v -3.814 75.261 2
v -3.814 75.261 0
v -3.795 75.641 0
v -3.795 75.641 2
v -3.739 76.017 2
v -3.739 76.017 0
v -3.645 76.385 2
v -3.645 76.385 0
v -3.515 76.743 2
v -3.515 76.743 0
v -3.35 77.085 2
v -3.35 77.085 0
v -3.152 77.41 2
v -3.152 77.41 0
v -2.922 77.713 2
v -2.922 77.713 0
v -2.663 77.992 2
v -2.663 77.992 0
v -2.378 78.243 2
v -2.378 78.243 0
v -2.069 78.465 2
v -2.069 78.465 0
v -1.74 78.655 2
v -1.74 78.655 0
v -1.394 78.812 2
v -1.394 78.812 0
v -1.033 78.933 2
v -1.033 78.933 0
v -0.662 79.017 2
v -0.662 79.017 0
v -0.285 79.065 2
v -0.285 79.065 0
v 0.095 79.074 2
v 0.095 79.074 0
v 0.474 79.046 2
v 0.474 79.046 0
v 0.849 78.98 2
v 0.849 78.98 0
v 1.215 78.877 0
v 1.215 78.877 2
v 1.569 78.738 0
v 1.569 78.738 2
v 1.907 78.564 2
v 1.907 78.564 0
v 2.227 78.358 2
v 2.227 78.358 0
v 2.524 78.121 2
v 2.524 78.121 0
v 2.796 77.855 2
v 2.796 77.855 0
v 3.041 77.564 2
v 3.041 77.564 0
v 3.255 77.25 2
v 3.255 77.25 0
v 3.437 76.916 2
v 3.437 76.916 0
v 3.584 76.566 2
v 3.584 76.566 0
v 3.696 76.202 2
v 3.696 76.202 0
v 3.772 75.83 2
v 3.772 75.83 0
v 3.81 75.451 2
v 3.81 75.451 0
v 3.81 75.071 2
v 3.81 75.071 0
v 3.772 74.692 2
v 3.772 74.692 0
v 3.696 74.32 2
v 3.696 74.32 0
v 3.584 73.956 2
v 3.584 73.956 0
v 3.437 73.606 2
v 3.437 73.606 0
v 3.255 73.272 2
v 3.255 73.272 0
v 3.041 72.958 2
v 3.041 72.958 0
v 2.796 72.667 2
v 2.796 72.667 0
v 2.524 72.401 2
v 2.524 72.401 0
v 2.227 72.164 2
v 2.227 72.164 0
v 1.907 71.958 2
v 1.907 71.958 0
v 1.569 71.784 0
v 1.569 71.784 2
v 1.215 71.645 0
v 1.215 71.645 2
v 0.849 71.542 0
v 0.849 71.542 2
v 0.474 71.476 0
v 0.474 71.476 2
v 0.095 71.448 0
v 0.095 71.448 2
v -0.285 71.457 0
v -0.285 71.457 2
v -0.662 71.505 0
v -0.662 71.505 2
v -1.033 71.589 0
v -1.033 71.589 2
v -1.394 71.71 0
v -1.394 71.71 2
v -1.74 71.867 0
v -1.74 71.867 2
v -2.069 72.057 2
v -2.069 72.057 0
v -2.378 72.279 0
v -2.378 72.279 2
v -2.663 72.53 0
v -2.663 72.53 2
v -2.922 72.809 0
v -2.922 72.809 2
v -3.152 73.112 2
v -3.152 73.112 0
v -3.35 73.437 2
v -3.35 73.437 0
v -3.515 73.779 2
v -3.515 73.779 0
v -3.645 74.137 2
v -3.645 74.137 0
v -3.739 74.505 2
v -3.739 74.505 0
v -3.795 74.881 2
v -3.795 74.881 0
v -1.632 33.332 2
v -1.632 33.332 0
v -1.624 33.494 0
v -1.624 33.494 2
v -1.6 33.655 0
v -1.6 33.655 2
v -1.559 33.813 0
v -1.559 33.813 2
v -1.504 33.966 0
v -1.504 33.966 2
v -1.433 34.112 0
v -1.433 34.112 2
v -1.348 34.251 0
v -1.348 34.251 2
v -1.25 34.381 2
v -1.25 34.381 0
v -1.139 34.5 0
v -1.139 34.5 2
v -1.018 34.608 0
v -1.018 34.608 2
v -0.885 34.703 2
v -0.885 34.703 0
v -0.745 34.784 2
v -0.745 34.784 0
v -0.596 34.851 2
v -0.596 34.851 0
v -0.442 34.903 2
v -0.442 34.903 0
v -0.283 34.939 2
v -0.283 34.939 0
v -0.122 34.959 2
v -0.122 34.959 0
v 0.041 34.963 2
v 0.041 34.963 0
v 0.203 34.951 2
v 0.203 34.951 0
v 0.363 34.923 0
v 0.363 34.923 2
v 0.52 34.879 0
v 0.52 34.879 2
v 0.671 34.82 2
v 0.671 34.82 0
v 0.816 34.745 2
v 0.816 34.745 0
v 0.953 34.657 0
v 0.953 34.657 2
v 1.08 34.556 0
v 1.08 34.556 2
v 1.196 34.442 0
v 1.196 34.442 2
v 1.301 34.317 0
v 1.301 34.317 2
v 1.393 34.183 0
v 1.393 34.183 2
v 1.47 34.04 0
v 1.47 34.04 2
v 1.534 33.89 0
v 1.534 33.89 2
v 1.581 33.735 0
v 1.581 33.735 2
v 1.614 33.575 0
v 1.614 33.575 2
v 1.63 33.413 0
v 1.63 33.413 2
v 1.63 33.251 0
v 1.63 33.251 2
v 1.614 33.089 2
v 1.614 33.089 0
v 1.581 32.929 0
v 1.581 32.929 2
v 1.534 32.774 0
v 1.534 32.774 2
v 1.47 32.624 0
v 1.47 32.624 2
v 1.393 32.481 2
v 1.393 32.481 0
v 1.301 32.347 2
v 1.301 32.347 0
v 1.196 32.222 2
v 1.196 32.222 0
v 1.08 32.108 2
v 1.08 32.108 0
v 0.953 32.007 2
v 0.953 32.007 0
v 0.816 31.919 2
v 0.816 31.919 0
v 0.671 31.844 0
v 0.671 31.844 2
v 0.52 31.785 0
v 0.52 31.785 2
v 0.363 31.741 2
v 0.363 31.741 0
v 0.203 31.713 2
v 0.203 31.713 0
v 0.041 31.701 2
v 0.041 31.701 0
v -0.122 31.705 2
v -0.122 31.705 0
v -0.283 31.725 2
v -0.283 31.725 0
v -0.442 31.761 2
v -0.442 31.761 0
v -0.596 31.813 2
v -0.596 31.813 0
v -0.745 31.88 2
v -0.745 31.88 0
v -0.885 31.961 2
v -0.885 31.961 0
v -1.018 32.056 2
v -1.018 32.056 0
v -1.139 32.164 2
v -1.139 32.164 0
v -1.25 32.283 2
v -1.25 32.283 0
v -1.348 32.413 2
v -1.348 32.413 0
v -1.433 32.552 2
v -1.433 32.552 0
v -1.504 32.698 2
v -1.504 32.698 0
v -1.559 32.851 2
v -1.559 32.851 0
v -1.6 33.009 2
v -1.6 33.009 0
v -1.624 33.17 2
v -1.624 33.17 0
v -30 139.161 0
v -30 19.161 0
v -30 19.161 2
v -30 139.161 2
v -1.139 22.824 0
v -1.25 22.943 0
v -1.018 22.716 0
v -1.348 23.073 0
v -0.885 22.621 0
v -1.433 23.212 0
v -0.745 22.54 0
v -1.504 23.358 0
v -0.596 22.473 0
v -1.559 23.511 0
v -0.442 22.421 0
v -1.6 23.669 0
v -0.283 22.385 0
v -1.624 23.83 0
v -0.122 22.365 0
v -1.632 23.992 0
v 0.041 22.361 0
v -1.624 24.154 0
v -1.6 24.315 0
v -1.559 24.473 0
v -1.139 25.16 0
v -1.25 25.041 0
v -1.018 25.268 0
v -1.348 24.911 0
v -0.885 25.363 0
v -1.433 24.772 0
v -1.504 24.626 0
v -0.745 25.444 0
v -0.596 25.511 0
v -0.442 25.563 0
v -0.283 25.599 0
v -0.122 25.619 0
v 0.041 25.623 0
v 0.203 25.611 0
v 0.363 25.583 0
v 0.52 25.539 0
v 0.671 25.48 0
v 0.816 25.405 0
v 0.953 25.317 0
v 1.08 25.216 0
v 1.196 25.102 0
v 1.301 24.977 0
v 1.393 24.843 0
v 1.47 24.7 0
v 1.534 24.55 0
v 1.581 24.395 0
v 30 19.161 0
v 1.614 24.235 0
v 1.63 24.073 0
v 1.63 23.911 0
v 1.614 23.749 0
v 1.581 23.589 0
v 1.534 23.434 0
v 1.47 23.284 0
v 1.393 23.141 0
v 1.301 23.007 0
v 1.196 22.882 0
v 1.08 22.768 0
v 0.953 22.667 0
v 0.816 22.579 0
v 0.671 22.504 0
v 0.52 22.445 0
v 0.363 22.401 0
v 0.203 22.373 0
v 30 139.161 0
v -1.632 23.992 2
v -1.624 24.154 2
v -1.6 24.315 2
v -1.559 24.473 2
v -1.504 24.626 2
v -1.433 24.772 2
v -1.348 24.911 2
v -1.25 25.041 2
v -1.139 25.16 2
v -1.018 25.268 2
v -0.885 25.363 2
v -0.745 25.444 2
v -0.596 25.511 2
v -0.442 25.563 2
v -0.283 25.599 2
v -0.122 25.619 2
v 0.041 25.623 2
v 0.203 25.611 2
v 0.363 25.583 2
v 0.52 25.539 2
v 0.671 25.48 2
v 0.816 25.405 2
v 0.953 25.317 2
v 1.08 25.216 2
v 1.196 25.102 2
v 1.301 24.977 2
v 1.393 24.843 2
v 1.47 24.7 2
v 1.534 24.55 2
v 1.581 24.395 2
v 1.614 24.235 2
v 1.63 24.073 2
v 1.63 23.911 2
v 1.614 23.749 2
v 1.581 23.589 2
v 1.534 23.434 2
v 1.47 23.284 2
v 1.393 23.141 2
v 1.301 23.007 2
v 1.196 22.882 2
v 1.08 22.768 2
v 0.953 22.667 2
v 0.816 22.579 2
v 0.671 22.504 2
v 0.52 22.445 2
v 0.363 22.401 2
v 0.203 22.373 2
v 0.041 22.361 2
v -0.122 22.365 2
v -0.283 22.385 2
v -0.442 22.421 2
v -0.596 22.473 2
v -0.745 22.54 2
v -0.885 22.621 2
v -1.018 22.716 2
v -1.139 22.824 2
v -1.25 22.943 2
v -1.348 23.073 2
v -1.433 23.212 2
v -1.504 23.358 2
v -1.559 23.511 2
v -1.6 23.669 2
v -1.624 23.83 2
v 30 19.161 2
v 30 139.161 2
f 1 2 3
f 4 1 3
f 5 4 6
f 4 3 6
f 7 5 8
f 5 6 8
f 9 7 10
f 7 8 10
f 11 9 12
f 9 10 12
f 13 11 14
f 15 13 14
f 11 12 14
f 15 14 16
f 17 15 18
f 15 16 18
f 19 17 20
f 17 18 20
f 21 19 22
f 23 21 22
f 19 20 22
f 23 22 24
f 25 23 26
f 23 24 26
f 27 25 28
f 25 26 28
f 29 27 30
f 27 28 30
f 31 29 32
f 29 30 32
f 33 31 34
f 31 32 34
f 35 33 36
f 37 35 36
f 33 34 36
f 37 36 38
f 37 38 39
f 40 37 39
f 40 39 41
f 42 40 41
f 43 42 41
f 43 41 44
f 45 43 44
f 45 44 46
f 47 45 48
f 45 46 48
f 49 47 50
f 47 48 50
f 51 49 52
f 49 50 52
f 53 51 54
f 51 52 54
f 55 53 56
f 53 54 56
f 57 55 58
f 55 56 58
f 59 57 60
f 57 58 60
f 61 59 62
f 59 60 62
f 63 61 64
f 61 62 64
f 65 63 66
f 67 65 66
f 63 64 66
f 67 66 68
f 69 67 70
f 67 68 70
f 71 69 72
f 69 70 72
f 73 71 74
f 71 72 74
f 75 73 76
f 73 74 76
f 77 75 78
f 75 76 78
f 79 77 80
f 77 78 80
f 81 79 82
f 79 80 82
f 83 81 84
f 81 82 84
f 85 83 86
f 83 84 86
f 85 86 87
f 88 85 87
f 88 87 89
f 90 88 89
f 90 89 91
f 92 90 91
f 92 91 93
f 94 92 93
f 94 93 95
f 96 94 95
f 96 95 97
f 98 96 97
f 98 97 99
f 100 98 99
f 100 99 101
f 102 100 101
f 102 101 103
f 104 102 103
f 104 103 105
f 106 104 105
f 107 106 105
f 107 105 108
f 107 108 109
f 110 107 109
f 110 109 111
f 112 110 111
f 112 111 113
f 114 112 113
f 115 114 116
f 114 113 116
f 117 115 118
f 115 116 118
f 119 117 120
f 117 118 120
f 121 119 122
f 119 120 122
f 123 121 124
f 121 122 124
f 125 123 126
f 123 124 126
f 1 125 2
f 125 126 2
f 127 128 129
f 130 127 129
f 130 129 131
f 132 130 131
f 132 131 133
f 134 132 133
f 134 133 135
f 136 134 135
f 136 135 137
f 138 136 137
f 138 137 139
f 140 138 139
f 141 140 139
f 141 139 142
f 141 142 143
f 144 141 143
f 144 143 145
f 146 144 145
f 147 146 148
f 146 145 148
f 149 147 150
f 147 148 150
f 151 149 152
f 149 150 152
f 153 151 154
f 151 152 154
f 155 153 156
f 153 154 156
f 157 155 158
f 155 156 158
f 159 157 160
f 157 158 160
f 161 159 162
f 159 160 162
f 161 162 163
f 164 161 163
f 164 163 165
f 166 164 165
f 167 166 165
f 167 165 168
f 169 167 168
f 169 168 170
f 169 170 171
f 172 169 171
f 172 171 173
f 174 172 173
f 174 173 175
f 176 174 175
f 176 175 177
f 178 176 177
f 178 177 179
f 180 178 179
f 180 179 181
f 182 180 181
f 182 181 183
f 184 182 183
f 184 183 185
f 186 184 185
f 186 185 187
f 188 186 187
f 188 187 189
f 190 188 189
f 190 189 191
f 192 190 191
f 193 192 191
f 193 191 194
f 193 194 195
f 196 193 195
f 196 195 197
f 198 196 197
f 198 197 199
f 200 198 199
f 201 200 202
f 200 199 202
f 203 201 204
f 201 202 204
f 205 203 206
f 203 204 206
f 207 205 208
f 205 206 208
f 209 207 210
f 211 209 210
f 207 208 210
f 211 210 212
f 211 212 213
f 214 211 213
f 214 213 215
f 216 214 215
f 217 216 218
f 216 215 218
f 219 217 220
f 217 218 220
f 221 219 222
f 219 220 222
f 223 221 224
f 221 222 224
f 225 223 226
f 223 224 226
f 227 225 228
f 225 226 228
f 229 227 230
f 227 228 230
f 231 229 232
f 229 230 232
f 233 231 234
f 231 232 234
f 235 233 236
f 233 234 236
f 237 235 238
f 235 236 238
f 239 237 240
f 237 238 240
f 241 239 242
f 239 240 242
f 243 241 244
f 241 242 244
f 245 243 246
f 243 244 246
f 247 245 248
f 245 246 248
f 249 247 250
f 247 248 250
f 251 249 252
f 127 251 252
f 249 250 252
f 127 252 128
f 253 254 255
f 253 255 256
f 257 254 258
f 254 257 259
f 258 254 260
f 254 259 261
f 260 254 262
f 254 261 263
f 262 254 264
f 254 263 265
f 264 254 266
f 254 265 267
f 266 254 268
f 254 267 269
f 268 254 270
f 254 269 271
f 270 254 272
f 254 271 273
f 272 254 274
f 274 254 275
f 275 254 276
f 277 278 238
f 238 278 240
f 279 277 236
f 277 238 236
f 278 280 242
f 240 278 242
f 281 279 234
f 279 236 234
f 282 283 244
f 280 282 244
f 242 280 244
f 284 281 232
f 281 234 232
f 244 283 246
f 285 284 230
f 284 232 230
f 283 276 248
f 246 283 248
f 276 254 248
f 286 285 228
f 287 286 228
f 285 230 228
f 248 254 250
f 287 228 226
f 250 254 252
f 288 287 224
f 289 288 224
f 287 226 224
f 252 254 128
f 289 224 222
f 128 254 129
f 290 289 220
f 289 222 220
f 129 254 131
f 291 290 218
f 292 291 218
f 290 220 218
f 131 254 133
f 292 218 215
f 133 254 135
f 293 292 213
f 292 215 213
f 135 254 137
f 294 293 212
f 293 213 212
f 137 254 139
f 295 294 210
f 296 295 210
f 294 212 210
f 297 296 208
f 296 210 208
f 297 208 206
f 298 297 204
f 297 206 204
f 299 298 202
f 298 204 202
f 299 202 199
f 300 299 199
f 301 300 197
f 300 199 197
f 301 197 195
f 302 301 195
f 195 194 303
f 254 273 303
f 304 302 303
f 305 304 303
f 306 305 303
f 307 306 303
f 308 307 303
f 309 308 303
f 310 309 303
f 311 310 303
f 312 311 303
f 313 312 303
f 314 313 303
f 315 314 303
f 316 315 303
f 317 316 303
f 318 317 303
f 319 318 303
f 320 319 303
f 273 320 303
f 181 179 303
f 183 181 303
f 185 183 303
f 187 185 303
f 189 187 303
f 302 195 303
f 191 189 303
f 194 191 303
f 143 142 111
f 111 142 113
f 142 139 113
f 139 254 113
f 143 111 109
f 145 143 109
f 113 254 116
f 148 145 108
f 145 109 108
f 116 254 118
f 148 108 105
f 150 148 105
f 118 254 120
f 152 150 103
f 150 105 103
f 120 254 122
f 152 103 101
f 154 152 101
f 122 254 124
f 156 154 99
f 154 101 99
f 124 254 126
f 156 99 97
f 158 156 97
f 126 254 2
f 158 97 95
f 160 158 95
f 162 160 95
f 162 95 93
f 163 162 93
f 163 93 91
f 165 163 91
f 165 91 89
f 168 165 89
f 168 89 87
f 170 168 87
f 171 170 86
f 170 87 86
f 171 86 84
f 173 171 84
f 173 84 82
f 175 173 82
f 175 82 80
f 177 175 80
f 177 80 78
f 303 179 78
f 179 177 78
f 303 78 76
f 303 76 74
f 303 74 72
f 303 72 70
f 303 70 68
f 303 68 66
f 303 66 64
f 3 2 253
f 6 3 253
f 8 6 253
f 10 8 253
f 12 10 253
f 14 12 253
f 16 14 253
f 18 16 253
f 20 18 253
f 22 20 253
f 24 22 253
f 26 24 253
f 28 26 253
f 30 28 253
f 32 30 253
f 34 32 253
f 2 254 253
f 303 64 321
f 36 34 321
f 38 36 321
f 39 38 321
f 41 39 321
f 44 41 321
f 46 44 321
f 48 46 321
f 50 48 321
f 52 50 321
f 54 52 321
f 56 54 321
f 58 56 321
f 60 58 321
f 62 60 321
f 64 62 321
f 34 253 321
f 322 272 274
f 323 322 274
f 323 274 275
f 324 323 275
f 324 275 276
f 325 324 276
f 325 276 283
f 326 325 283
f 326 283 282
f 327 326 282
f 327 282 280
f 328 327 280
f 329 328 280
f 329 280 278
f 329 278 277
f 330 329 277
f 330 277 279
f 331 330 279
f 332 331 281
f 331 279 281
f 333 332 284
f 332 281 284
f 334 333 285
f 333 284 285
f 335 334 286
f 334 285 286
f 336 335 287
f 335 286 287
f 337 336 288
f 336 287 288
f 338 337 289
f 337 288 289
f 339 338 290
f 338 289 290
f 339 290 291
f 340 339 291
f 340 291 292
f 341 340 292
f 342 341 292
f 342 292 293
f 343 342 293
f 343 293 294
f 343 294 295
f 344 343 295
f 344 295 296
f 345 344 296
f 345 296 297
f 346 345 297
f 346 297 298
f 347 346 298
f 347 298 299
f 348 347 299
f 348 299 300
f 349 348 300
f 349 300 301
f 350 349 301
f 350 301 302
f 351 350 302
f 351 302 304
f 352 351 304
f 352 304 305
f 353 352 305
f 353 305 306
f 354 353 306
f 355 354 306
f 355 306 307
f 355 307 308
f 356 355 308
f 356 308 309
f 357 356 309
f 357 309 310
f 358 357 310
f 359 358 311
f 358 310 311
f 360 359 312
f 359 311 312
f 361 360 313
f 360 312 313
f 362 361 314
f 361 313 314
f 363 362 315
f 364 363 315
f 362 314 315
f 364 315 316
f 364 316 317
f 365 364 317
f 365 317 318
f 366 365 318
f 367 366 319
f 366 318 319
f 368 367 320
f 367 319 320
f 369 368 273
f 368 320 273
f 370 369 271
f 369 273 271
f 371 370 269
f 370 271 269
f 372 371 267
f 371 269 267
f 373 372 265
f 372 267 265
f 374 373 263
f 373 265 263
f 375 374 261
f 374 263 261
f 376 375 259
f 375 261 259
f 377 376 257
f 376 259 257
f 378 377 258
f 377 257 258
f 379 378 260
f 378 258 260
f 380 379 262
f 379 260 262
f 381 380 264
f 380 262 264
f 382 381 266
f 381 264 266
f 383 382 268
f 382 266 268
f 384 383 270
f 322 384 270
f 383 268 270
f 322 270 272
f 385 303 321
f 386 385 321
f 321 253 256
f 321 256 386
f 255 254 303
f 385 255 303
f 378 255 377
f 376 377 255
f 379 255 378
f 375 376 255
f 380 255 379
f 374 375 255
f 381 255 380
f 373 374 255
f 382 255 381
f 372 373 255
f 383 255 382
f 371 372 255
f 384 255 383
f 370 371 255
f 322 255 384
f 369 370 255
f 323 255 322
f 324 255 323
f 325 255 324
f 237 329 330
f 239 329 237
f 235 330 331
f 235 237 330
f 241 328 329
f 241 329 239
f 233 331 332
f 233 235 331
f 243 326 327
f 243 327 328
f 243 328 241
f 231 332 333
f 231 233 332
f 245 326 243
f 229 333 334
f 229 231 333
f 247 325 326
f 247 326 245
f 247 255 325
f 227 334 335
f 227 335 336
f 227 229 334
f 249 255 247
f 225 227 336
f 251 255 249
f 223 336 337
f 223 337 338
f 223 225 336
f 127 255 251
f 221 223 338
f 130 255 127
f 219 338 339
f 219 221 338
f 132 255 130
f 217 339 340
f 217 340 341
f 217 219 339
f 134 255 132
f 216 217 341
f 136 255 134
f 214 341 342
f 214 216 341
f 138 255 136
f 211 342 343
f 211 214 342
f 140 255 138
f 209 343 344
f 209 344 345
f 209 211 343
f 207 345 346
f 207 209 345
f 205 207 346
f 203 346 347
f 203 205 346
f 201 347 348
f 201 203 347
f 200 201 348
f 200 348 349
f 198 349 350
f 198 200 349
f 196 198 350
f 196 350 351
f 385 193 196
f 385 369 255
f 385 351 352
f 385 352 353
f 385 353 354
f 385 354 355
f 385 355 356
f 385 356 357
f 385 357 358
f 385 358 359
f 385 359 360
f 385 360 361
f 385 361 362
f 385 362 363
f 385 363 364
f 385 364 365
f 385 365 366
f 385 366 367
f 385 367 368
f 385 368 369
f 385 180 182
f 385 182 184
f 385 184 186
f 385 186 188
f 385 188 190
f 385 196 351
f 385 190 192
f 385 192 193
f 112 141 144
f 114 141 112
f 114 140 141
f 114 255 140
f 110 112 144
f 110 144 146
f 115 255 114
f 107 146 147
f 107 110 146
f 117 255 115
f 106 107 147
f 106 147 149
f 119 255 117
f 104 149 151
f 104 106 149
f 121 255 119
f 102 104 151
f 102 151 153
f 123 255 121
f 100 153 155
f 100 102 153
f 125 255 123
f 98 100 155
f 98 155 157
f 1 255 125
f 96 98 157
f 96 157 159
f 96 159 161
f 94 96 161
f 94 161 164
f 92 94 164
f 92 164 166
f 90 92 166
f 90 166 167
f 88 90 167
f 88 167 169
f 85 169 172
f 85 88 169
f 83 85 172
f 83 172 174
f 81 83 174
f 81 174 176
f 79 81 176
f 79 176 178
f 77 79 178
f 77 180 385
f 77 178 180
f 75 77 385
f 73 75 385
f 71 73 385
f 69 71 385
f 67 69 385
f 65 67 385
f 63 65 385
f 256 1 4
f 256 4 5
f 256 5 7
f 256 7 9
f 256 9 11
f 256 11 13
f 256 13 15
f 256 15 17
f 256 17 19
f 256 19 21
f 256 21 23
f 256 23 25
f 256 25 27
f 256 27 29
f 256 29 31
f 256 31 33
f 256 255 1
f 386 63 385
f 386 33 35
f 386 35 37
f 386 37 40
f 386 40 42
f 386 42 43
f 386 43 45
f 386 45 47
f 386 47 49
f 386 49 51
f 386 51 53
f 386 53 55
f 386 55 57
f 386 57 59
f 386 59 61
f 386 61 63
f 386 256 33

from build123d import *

# Parameters (mm, degrees)
SKETCH1_W                 = 60
SKETCH1_H                 = 120
BOSS_EXTRUDE1_DEPTH       = 2
SKETCH2_R                 = 3.814375117
CUT_EXTRUDE1_DEPTH        = 2
F_4_CLEARANCE_HOLE2_D     = 3.2639
F_4_CLEARANCE_HOLE2_DEPTH = 10
F_4_CLEARANCE_HOLE2_TIP   = 0.980574487


with BuildPart() as part:
    # Sketch1 → Boss-Extrude1 (new body)
    with BuildSketch(Plane.XY):
        with Locations((0, 79.160593828)):
            Rectangle(SKETCH1_W, SKETCH1_H)
    extrude(amount=BOSS_EXTRUDE1_DEPTH)

    # Sketch2 → Cut-Extrude1 (cut)
    with BuildSketch(Plane(origin=(0, 0, 0), x_dir=(-1, 0, 0), z_dir=(0, 0, -1))):
        with Locations((0, 75.261)):
            Circle(SKETCH2_R)
    extrude(amount=-CUT_EXTRUDE1_DEPTH, mode=Mode.SUBTRACT)

    # #4 Clearance Hole2
    with Locations(Plane.XY.offset(2)):
        with Locations((0, 33.332), (0, 23.992)):
            Hole(F_4_CLEARANCE_HOLE2_D / 2, depth=F_4_CLEARANCE_HOLE2_DEPTH)
            with Locations((0, 0, -(F_4_CLEARANCE_HOLE2_DEPTH + F_4_CLEARANCE_HOLE2_TIP / 2))):  # 118° drill point
                Cone(0, F_4_CLEARANCE_HOLE2_D / 2, F_4_CLEARANCE_HOLE2_TIP, mode=Mode.SUBTRACT)


solid = part.part
